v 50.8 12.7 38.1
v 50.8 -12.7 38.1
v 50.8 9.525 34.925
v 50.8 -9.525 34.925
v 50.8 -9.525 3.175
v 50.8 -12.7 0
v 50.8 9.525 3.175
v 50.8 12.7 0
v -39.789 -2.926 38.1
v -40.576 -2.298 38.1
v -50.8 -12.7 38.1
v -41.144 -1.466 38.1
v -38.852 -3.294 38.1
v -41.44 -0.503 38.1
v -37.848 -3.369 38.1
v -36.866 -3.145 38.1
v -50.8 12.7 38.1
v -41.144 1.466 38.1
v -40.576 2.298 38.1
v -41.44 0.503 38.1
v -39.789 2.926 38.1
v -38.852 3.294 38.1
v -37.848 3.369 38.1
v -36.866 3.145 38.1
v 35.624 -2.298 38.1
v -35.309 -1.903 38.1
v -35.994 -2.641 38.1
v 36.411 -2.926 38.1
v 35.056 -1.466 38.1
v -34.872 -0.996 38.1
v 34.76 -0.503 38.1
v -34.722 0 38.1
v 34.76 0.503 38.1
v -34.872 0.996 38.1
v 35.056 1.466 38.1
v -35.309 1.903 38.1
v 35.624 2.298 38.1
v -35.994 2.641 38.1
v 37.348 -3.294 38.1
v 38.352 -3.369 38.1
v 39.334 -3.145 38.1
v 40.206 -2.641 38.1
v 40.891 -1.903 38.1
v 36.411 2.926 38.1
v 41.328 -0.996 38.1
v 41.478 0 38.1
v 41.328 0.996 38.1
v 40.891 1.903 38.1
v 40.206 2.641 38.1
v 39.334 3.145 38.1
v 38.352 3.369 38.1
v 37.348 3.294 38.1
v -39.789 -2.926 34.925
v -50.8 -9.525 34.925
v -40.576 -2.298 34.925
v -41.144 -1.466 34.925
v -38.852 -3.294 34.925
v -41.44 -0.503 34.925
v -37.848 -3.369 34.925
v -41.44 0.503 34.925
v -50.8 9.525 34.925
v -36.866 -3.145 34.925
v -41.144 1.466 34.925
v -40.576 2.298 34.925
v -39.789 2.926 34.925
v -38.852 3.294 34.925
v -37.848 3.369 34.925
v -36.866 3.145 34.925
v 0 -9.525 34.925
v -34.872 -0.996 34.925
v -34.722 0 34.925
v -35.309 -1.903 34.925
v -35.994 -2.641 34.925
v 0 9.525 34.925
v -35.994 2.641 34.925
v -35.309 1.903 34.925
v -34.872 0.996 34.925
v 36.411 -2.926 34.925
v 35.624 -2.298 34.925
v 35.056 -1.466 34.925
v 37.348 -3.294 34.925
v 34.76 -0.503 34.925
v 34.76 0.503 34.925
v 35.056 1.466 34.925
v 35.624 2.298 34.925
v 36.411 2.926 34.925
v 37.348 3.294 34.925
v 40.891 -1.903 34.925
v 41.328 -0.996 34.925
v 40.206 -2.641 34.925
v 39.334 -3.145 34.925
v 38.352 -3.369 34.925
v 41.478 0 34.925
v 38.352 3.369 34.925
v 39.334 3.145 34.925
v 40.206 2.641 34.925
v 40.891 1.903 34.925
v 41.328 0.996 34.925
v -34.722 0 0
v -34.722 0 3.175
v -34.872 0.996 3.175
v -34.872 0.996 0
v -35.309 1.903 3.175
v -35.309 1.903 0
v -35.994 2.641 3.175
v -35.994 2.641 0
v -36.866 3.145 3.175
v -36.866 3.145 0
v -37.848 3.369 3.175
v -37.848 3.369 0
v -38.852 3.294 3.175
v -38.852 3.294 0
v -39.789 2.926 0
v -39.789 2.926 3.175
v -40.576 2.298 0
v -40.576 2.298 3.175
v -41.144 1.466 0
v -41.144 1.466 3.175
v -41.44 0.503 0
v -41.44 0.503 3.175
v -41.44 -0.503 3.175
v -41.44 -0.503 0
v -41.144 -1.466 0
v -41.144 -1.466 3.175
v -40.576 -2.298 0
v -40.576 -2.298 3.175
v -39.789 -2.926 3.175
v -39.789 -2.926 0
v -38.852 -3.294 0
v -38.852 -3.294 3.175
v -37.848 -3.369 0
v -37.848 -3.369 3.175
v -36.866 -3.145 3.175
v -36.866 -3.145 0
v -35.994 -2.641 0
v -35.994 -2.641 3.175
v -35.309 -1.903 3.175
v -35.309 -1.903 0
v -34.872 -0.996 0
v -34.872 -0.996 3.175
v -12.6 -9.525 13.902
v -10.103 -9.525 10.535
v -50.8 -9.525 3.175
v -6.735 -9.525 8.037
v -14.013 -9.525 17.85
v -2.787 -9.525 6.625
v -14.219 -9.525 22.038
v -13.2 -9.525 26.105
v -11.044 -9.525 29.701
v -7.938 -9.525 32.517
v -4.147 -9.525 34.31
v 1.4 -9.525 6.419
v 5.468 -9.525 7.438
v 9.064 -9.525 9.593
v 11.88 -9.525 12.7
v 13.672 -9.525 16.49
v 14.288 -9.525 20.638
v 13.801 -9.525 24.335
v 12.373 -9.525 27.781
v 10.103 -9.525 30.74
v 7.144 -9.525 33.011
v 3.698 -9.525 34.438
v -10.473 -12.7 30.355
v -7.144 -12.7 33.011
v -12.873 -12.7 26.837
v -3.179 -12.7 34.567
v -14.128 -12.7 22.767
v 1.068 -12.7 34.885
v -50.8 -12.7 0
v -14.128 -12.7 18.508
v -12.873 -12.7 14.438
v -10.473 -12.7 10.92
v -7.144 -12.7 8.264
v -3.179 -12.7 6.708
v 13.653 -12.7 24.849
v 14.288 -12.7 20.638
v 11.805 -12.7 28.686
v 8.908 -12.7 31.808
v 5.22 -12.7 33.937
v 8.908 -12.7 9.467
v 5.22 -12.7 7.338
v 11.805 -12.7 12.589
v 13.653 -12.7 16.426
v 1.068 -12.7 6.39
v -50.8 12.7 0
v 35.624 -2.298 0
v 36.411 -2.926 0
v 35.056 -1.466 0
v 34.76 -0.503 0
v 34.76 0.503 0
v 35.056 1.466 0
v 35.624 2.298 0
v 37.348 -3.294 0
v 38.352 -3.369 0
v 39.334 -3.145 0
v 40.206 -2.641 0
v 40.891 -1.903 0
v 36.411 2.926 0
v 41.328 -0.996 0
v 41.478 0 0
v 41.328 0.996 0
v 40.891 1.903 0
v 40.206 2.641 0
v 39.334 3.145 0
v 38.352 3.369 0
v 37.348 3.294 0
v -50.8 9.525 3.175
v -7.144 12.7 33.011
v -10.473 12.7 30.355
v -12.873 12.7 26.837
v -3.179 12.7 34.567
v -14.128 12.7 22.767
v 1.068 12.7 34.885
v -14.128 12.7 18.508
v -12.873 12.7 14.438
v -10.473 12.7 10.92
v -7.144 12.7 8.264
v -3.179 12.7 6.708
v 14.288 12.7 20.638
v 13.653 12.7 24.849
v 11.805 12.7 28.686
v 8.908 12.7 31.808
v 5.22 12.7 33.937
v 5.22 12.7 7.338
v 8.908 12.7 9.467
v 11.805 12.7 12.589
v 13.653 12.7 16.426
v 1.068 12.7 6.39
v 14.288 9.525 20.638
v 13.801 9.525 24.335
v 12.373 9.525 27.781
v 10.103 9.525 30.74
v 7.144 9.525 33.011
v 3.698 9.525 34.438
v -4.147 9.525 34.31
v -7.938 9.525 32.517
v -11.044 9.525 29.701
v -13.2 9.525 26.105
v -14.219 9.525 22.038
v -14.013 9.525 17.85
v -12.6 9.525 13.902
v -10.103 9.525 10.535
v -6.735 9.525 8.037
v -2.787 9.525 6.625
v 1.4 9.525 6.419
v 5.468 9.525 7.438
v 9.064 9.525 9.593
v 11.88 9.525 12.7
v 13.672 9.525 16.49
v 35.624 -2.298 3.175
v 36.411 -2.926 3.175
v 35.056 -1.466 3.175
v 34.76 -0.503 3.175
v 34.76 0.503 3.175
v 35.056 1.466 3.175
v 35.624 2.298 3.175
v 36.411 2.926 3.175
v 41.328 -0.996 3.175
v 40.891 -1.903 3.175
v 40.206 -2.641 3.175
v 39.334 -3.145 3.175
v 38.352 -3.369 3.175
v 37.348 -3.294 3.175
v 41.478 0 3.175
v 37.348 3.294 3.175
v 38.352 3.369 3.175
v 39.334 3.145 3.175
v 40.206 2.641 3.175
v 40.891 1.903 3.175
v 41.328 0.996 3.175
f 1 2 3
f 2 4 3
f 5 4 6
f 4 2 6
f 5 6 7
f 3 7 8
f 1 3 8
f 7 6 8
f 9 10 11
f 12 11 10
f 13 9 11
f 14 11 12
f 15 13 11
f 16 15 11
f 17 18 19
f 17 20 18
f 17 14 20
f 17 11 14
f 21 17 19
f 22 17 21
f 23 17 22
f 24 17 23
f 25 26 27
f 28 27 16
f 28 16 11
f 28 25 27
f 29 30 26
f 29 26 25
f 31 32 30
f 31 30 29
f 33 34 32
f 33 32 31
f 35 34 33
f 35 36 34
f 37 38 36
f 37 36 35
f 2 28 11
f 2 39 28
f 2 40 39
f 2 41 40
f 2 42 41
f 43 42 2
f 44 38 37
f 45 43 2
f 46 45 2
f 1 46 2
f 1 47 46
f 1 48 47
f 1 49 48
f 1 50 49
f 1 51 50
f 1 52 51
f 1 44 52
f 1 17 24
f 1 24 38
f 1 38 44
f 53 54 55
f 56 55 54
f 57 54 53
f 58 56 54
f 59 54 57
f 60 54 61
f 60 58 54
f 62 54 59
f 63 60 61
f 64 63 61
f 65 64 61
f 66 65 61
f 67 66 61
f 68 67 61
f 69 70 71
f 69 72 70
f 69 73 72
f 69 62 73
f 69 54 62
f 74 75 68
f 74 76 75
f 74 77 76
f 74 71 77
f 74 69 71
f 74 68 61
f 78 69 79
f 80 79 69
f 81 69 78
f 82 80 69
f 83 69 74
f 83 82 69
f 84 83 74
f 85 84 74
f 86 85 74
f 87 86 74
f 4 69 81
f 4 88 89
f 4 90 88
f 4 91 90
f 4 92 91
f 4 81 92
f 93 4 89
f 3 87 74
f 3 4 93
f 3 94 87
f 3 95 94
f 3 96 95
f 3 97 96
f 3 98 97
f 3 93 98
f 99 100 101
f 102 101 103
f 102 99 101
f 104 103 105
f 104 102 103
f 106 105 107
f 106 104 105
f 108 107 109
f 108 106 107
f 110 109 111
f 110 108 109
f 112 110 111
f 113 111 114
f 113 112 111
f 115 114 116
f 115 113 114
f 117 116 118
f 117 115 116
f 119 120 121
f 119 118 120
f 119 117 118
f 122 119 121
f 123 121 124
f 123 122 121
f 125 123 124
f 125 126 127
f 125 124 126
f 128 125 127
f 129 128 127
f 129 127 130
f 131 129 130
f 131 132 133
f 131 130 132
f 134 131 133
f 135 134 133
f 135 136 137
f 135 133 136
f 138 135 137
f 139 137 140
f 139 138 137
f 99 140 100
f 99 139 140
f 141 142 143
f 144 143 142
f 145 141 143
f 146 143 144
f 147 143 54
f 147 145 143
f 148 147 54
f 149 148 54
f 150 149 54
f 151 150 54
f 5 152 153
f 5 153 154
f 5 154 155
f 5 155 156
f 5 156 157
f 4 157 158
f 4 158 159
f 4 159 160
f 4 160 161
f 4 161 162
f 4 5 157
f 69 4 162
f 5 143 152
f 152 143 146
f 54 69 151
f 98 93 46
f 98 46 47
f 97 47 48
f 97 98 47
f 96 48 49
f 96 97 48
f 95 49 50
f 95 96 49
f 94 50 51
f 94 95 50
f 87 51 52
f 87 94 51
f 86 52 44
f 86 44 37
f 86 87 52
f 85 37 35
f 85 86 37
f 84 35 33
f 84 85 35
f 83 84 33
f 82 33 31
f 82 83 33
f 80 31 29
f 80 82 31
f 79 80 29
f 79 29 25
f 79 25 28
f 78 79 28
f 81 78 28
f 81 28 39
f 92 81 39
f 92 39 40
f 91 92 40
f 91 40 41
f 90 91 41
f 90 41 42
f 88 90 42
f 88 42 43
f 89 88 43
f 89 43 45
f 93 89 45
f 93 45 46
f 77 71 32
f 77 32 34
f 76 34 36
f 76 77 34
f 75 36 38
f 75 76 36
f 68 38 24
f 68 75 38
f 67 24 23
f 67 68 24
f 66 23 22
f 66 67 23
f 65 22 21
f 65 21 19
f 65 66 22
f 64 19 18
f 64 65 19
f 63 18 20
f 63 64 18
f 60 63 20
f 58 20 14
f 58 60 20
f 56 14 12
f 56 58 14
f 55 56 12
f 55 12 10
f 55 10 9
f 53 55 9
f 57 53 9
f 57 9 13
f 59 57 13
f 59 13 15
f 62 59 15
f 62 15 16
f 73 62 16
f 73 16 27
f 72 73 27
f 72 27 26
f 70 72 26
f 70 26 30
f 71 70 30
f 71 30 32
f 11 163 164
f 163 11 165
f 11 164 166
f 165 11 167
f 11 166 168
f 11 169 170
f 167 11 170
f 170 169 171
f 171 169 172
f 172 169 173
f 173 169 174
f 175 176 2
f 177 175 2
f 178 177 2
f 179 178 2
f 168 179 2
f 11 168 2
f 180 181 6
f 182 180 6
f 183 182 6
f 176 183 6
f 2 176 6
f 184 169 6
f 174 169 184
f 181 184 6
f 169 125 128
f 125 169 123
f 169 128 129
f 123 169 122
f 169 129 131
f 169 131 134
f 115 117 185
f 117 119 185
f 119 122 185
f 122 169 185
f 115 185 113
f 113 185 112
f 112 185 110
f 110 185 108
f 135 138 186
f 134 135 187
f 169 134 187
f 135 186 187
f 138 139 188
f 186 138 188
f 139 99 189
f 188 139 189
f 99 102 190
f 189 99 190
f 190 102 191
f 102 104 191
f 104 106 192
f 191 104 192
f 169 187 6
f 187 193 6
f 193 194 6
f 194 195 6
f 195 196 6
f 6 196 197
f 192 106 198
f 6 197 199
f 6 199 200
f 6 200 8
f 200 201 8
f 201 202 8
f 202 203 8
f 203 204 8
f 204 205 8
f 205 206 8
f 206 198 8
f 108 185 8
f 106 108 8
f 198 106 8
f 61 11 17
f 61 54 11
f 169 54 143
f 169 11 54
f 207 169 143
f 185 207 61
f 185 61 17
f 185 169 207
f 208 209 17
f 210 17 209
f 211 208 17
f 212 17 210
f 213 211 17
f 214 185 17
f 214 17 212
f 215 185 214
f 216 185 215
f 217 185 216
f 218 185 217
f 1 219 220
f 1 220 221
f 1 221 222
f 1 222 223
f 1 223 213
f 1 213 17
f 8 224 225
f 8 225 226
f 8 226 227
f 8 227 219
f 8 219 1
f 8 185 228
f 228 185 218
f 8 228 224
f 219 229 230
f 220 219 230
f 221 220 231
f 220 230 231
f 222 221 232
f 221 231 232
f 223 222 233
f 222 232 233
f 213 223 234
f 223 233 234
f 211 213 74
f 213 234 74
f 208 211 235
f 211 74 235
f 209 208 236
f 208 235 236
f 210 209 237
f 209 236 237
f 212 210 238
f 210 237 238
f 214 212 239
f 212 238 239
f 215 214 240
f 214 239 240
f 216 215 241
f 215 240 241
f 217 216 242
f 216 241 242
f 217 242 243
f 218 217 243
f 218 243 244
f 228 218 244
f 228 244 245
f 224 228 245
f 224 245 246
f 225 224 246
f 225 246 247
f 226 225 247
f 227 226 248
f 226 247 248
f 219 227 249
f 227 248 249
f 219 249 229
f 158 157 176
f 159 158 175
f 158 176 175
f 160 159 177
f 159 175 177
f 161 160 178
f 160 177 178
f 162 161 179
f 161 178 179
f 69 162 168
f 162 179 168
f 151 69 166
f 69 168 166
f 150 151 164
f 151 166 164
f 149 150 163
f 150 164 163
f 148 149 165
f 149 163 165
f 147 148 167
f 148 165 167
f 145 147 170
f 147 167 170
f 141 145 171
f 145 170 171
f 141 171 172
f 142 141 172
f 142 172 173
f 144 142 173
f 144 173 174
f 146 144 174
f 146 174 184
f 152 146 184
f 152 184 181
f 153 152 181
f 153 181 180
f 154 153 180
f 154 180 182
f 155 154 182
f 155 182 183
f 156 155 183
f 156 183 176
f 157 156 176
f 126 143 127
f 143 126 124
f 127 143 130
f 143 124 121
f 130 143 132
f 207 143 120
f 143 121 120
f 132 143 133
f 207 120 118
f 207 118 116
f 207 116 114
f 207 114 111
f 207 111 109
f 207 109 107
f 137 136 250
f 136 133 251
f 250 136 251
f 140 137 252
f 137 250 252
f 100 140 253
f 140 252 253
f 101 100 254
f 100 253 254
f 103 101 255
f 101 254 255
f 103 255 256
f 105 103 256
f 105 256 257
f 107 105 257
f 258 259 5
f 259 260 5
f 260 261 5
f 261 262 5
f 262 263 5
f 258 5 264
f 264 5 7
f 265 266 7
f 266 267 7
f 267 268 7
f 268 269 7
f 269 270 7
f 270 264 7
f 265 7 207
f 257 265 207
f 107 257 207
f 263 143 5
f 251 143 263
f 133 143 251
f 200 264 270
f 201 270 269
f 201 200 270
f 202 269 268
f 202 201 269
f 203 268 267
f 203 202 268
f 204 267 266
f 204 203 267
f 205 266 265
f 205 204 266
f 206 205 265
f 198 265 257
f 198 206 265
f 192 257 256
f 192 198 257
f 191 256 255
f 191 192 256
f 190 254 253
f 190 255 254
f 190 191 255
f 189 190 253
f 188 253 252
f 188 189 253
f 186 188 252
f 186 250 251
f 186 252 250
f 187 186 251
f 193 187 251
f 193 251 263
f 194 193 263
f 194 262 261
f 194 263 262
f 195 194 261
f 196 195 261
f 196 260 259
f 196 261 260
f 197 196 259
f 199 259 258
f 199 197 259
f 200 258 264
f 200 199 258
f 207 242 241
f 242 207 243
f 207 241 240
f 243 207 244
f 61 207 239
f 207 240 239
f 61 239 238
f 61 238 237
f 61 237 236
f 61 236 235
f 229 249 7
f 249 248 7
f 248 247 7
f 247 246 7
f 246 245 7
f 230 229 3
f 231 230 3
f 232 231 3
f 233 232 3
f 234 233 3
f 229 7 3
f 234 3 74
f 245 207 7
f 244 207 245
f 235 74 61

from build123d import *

# Parameters (mm, degrees)
F0_W          = 101.6
F0_H          = 25.4
F0_R          = 3.3782
F1_DEPTH      = 38.1
F2_R          = 14.2875
F3_DEPTH      = 25.4
F4_W          = 19.05
F4_H          = 31.75
F5_DEPTH      = 50.801
F5_DEPTH_BACK = 50.801


# Not quite as in the source:
# - a feature names something its author has since deleted; it is built from what else it names


with BuildPart() as f1:
    # F0 (on Top) → F1 (new body)
    with BuildSketch(Plane.XY):
        Rectangle(F0_W, F0_H)
        with Locations((-38.1, 0)):
            Circle(F0_R, mode=Mode.SUBTRACT)
        with Locations((38.1, 0)):
            Circle(F0_R, mode=Mode.SUBTRACT)
    extrude(amount=F1_DEPTH)

    # F2 (on face) → F3 (cut)
    with BuildSketch(Plane.XZ.offset(12.7)):
        with Locations((0, 20.6375)):
            Circle(F2_R)
    extrude(amount=-F3_DEPTH, mode=Mode.SUBTRACT)

    # F4 (on Right) → F5 (cut, two sides)
    with BuildSketch(Plane.YZ) as f5_sk:
        with Locations((0, 19.05)):
            Rectangle(F4_W, F4_H)
    extrude(amount=-F5_DEPTH, mode=Mode.SUBTRACT)
    extrude(f5_sk.sketch, amount=F5_DEPTH_BACK, mode=Mode.SUBTRACT)


solid = f1.part
